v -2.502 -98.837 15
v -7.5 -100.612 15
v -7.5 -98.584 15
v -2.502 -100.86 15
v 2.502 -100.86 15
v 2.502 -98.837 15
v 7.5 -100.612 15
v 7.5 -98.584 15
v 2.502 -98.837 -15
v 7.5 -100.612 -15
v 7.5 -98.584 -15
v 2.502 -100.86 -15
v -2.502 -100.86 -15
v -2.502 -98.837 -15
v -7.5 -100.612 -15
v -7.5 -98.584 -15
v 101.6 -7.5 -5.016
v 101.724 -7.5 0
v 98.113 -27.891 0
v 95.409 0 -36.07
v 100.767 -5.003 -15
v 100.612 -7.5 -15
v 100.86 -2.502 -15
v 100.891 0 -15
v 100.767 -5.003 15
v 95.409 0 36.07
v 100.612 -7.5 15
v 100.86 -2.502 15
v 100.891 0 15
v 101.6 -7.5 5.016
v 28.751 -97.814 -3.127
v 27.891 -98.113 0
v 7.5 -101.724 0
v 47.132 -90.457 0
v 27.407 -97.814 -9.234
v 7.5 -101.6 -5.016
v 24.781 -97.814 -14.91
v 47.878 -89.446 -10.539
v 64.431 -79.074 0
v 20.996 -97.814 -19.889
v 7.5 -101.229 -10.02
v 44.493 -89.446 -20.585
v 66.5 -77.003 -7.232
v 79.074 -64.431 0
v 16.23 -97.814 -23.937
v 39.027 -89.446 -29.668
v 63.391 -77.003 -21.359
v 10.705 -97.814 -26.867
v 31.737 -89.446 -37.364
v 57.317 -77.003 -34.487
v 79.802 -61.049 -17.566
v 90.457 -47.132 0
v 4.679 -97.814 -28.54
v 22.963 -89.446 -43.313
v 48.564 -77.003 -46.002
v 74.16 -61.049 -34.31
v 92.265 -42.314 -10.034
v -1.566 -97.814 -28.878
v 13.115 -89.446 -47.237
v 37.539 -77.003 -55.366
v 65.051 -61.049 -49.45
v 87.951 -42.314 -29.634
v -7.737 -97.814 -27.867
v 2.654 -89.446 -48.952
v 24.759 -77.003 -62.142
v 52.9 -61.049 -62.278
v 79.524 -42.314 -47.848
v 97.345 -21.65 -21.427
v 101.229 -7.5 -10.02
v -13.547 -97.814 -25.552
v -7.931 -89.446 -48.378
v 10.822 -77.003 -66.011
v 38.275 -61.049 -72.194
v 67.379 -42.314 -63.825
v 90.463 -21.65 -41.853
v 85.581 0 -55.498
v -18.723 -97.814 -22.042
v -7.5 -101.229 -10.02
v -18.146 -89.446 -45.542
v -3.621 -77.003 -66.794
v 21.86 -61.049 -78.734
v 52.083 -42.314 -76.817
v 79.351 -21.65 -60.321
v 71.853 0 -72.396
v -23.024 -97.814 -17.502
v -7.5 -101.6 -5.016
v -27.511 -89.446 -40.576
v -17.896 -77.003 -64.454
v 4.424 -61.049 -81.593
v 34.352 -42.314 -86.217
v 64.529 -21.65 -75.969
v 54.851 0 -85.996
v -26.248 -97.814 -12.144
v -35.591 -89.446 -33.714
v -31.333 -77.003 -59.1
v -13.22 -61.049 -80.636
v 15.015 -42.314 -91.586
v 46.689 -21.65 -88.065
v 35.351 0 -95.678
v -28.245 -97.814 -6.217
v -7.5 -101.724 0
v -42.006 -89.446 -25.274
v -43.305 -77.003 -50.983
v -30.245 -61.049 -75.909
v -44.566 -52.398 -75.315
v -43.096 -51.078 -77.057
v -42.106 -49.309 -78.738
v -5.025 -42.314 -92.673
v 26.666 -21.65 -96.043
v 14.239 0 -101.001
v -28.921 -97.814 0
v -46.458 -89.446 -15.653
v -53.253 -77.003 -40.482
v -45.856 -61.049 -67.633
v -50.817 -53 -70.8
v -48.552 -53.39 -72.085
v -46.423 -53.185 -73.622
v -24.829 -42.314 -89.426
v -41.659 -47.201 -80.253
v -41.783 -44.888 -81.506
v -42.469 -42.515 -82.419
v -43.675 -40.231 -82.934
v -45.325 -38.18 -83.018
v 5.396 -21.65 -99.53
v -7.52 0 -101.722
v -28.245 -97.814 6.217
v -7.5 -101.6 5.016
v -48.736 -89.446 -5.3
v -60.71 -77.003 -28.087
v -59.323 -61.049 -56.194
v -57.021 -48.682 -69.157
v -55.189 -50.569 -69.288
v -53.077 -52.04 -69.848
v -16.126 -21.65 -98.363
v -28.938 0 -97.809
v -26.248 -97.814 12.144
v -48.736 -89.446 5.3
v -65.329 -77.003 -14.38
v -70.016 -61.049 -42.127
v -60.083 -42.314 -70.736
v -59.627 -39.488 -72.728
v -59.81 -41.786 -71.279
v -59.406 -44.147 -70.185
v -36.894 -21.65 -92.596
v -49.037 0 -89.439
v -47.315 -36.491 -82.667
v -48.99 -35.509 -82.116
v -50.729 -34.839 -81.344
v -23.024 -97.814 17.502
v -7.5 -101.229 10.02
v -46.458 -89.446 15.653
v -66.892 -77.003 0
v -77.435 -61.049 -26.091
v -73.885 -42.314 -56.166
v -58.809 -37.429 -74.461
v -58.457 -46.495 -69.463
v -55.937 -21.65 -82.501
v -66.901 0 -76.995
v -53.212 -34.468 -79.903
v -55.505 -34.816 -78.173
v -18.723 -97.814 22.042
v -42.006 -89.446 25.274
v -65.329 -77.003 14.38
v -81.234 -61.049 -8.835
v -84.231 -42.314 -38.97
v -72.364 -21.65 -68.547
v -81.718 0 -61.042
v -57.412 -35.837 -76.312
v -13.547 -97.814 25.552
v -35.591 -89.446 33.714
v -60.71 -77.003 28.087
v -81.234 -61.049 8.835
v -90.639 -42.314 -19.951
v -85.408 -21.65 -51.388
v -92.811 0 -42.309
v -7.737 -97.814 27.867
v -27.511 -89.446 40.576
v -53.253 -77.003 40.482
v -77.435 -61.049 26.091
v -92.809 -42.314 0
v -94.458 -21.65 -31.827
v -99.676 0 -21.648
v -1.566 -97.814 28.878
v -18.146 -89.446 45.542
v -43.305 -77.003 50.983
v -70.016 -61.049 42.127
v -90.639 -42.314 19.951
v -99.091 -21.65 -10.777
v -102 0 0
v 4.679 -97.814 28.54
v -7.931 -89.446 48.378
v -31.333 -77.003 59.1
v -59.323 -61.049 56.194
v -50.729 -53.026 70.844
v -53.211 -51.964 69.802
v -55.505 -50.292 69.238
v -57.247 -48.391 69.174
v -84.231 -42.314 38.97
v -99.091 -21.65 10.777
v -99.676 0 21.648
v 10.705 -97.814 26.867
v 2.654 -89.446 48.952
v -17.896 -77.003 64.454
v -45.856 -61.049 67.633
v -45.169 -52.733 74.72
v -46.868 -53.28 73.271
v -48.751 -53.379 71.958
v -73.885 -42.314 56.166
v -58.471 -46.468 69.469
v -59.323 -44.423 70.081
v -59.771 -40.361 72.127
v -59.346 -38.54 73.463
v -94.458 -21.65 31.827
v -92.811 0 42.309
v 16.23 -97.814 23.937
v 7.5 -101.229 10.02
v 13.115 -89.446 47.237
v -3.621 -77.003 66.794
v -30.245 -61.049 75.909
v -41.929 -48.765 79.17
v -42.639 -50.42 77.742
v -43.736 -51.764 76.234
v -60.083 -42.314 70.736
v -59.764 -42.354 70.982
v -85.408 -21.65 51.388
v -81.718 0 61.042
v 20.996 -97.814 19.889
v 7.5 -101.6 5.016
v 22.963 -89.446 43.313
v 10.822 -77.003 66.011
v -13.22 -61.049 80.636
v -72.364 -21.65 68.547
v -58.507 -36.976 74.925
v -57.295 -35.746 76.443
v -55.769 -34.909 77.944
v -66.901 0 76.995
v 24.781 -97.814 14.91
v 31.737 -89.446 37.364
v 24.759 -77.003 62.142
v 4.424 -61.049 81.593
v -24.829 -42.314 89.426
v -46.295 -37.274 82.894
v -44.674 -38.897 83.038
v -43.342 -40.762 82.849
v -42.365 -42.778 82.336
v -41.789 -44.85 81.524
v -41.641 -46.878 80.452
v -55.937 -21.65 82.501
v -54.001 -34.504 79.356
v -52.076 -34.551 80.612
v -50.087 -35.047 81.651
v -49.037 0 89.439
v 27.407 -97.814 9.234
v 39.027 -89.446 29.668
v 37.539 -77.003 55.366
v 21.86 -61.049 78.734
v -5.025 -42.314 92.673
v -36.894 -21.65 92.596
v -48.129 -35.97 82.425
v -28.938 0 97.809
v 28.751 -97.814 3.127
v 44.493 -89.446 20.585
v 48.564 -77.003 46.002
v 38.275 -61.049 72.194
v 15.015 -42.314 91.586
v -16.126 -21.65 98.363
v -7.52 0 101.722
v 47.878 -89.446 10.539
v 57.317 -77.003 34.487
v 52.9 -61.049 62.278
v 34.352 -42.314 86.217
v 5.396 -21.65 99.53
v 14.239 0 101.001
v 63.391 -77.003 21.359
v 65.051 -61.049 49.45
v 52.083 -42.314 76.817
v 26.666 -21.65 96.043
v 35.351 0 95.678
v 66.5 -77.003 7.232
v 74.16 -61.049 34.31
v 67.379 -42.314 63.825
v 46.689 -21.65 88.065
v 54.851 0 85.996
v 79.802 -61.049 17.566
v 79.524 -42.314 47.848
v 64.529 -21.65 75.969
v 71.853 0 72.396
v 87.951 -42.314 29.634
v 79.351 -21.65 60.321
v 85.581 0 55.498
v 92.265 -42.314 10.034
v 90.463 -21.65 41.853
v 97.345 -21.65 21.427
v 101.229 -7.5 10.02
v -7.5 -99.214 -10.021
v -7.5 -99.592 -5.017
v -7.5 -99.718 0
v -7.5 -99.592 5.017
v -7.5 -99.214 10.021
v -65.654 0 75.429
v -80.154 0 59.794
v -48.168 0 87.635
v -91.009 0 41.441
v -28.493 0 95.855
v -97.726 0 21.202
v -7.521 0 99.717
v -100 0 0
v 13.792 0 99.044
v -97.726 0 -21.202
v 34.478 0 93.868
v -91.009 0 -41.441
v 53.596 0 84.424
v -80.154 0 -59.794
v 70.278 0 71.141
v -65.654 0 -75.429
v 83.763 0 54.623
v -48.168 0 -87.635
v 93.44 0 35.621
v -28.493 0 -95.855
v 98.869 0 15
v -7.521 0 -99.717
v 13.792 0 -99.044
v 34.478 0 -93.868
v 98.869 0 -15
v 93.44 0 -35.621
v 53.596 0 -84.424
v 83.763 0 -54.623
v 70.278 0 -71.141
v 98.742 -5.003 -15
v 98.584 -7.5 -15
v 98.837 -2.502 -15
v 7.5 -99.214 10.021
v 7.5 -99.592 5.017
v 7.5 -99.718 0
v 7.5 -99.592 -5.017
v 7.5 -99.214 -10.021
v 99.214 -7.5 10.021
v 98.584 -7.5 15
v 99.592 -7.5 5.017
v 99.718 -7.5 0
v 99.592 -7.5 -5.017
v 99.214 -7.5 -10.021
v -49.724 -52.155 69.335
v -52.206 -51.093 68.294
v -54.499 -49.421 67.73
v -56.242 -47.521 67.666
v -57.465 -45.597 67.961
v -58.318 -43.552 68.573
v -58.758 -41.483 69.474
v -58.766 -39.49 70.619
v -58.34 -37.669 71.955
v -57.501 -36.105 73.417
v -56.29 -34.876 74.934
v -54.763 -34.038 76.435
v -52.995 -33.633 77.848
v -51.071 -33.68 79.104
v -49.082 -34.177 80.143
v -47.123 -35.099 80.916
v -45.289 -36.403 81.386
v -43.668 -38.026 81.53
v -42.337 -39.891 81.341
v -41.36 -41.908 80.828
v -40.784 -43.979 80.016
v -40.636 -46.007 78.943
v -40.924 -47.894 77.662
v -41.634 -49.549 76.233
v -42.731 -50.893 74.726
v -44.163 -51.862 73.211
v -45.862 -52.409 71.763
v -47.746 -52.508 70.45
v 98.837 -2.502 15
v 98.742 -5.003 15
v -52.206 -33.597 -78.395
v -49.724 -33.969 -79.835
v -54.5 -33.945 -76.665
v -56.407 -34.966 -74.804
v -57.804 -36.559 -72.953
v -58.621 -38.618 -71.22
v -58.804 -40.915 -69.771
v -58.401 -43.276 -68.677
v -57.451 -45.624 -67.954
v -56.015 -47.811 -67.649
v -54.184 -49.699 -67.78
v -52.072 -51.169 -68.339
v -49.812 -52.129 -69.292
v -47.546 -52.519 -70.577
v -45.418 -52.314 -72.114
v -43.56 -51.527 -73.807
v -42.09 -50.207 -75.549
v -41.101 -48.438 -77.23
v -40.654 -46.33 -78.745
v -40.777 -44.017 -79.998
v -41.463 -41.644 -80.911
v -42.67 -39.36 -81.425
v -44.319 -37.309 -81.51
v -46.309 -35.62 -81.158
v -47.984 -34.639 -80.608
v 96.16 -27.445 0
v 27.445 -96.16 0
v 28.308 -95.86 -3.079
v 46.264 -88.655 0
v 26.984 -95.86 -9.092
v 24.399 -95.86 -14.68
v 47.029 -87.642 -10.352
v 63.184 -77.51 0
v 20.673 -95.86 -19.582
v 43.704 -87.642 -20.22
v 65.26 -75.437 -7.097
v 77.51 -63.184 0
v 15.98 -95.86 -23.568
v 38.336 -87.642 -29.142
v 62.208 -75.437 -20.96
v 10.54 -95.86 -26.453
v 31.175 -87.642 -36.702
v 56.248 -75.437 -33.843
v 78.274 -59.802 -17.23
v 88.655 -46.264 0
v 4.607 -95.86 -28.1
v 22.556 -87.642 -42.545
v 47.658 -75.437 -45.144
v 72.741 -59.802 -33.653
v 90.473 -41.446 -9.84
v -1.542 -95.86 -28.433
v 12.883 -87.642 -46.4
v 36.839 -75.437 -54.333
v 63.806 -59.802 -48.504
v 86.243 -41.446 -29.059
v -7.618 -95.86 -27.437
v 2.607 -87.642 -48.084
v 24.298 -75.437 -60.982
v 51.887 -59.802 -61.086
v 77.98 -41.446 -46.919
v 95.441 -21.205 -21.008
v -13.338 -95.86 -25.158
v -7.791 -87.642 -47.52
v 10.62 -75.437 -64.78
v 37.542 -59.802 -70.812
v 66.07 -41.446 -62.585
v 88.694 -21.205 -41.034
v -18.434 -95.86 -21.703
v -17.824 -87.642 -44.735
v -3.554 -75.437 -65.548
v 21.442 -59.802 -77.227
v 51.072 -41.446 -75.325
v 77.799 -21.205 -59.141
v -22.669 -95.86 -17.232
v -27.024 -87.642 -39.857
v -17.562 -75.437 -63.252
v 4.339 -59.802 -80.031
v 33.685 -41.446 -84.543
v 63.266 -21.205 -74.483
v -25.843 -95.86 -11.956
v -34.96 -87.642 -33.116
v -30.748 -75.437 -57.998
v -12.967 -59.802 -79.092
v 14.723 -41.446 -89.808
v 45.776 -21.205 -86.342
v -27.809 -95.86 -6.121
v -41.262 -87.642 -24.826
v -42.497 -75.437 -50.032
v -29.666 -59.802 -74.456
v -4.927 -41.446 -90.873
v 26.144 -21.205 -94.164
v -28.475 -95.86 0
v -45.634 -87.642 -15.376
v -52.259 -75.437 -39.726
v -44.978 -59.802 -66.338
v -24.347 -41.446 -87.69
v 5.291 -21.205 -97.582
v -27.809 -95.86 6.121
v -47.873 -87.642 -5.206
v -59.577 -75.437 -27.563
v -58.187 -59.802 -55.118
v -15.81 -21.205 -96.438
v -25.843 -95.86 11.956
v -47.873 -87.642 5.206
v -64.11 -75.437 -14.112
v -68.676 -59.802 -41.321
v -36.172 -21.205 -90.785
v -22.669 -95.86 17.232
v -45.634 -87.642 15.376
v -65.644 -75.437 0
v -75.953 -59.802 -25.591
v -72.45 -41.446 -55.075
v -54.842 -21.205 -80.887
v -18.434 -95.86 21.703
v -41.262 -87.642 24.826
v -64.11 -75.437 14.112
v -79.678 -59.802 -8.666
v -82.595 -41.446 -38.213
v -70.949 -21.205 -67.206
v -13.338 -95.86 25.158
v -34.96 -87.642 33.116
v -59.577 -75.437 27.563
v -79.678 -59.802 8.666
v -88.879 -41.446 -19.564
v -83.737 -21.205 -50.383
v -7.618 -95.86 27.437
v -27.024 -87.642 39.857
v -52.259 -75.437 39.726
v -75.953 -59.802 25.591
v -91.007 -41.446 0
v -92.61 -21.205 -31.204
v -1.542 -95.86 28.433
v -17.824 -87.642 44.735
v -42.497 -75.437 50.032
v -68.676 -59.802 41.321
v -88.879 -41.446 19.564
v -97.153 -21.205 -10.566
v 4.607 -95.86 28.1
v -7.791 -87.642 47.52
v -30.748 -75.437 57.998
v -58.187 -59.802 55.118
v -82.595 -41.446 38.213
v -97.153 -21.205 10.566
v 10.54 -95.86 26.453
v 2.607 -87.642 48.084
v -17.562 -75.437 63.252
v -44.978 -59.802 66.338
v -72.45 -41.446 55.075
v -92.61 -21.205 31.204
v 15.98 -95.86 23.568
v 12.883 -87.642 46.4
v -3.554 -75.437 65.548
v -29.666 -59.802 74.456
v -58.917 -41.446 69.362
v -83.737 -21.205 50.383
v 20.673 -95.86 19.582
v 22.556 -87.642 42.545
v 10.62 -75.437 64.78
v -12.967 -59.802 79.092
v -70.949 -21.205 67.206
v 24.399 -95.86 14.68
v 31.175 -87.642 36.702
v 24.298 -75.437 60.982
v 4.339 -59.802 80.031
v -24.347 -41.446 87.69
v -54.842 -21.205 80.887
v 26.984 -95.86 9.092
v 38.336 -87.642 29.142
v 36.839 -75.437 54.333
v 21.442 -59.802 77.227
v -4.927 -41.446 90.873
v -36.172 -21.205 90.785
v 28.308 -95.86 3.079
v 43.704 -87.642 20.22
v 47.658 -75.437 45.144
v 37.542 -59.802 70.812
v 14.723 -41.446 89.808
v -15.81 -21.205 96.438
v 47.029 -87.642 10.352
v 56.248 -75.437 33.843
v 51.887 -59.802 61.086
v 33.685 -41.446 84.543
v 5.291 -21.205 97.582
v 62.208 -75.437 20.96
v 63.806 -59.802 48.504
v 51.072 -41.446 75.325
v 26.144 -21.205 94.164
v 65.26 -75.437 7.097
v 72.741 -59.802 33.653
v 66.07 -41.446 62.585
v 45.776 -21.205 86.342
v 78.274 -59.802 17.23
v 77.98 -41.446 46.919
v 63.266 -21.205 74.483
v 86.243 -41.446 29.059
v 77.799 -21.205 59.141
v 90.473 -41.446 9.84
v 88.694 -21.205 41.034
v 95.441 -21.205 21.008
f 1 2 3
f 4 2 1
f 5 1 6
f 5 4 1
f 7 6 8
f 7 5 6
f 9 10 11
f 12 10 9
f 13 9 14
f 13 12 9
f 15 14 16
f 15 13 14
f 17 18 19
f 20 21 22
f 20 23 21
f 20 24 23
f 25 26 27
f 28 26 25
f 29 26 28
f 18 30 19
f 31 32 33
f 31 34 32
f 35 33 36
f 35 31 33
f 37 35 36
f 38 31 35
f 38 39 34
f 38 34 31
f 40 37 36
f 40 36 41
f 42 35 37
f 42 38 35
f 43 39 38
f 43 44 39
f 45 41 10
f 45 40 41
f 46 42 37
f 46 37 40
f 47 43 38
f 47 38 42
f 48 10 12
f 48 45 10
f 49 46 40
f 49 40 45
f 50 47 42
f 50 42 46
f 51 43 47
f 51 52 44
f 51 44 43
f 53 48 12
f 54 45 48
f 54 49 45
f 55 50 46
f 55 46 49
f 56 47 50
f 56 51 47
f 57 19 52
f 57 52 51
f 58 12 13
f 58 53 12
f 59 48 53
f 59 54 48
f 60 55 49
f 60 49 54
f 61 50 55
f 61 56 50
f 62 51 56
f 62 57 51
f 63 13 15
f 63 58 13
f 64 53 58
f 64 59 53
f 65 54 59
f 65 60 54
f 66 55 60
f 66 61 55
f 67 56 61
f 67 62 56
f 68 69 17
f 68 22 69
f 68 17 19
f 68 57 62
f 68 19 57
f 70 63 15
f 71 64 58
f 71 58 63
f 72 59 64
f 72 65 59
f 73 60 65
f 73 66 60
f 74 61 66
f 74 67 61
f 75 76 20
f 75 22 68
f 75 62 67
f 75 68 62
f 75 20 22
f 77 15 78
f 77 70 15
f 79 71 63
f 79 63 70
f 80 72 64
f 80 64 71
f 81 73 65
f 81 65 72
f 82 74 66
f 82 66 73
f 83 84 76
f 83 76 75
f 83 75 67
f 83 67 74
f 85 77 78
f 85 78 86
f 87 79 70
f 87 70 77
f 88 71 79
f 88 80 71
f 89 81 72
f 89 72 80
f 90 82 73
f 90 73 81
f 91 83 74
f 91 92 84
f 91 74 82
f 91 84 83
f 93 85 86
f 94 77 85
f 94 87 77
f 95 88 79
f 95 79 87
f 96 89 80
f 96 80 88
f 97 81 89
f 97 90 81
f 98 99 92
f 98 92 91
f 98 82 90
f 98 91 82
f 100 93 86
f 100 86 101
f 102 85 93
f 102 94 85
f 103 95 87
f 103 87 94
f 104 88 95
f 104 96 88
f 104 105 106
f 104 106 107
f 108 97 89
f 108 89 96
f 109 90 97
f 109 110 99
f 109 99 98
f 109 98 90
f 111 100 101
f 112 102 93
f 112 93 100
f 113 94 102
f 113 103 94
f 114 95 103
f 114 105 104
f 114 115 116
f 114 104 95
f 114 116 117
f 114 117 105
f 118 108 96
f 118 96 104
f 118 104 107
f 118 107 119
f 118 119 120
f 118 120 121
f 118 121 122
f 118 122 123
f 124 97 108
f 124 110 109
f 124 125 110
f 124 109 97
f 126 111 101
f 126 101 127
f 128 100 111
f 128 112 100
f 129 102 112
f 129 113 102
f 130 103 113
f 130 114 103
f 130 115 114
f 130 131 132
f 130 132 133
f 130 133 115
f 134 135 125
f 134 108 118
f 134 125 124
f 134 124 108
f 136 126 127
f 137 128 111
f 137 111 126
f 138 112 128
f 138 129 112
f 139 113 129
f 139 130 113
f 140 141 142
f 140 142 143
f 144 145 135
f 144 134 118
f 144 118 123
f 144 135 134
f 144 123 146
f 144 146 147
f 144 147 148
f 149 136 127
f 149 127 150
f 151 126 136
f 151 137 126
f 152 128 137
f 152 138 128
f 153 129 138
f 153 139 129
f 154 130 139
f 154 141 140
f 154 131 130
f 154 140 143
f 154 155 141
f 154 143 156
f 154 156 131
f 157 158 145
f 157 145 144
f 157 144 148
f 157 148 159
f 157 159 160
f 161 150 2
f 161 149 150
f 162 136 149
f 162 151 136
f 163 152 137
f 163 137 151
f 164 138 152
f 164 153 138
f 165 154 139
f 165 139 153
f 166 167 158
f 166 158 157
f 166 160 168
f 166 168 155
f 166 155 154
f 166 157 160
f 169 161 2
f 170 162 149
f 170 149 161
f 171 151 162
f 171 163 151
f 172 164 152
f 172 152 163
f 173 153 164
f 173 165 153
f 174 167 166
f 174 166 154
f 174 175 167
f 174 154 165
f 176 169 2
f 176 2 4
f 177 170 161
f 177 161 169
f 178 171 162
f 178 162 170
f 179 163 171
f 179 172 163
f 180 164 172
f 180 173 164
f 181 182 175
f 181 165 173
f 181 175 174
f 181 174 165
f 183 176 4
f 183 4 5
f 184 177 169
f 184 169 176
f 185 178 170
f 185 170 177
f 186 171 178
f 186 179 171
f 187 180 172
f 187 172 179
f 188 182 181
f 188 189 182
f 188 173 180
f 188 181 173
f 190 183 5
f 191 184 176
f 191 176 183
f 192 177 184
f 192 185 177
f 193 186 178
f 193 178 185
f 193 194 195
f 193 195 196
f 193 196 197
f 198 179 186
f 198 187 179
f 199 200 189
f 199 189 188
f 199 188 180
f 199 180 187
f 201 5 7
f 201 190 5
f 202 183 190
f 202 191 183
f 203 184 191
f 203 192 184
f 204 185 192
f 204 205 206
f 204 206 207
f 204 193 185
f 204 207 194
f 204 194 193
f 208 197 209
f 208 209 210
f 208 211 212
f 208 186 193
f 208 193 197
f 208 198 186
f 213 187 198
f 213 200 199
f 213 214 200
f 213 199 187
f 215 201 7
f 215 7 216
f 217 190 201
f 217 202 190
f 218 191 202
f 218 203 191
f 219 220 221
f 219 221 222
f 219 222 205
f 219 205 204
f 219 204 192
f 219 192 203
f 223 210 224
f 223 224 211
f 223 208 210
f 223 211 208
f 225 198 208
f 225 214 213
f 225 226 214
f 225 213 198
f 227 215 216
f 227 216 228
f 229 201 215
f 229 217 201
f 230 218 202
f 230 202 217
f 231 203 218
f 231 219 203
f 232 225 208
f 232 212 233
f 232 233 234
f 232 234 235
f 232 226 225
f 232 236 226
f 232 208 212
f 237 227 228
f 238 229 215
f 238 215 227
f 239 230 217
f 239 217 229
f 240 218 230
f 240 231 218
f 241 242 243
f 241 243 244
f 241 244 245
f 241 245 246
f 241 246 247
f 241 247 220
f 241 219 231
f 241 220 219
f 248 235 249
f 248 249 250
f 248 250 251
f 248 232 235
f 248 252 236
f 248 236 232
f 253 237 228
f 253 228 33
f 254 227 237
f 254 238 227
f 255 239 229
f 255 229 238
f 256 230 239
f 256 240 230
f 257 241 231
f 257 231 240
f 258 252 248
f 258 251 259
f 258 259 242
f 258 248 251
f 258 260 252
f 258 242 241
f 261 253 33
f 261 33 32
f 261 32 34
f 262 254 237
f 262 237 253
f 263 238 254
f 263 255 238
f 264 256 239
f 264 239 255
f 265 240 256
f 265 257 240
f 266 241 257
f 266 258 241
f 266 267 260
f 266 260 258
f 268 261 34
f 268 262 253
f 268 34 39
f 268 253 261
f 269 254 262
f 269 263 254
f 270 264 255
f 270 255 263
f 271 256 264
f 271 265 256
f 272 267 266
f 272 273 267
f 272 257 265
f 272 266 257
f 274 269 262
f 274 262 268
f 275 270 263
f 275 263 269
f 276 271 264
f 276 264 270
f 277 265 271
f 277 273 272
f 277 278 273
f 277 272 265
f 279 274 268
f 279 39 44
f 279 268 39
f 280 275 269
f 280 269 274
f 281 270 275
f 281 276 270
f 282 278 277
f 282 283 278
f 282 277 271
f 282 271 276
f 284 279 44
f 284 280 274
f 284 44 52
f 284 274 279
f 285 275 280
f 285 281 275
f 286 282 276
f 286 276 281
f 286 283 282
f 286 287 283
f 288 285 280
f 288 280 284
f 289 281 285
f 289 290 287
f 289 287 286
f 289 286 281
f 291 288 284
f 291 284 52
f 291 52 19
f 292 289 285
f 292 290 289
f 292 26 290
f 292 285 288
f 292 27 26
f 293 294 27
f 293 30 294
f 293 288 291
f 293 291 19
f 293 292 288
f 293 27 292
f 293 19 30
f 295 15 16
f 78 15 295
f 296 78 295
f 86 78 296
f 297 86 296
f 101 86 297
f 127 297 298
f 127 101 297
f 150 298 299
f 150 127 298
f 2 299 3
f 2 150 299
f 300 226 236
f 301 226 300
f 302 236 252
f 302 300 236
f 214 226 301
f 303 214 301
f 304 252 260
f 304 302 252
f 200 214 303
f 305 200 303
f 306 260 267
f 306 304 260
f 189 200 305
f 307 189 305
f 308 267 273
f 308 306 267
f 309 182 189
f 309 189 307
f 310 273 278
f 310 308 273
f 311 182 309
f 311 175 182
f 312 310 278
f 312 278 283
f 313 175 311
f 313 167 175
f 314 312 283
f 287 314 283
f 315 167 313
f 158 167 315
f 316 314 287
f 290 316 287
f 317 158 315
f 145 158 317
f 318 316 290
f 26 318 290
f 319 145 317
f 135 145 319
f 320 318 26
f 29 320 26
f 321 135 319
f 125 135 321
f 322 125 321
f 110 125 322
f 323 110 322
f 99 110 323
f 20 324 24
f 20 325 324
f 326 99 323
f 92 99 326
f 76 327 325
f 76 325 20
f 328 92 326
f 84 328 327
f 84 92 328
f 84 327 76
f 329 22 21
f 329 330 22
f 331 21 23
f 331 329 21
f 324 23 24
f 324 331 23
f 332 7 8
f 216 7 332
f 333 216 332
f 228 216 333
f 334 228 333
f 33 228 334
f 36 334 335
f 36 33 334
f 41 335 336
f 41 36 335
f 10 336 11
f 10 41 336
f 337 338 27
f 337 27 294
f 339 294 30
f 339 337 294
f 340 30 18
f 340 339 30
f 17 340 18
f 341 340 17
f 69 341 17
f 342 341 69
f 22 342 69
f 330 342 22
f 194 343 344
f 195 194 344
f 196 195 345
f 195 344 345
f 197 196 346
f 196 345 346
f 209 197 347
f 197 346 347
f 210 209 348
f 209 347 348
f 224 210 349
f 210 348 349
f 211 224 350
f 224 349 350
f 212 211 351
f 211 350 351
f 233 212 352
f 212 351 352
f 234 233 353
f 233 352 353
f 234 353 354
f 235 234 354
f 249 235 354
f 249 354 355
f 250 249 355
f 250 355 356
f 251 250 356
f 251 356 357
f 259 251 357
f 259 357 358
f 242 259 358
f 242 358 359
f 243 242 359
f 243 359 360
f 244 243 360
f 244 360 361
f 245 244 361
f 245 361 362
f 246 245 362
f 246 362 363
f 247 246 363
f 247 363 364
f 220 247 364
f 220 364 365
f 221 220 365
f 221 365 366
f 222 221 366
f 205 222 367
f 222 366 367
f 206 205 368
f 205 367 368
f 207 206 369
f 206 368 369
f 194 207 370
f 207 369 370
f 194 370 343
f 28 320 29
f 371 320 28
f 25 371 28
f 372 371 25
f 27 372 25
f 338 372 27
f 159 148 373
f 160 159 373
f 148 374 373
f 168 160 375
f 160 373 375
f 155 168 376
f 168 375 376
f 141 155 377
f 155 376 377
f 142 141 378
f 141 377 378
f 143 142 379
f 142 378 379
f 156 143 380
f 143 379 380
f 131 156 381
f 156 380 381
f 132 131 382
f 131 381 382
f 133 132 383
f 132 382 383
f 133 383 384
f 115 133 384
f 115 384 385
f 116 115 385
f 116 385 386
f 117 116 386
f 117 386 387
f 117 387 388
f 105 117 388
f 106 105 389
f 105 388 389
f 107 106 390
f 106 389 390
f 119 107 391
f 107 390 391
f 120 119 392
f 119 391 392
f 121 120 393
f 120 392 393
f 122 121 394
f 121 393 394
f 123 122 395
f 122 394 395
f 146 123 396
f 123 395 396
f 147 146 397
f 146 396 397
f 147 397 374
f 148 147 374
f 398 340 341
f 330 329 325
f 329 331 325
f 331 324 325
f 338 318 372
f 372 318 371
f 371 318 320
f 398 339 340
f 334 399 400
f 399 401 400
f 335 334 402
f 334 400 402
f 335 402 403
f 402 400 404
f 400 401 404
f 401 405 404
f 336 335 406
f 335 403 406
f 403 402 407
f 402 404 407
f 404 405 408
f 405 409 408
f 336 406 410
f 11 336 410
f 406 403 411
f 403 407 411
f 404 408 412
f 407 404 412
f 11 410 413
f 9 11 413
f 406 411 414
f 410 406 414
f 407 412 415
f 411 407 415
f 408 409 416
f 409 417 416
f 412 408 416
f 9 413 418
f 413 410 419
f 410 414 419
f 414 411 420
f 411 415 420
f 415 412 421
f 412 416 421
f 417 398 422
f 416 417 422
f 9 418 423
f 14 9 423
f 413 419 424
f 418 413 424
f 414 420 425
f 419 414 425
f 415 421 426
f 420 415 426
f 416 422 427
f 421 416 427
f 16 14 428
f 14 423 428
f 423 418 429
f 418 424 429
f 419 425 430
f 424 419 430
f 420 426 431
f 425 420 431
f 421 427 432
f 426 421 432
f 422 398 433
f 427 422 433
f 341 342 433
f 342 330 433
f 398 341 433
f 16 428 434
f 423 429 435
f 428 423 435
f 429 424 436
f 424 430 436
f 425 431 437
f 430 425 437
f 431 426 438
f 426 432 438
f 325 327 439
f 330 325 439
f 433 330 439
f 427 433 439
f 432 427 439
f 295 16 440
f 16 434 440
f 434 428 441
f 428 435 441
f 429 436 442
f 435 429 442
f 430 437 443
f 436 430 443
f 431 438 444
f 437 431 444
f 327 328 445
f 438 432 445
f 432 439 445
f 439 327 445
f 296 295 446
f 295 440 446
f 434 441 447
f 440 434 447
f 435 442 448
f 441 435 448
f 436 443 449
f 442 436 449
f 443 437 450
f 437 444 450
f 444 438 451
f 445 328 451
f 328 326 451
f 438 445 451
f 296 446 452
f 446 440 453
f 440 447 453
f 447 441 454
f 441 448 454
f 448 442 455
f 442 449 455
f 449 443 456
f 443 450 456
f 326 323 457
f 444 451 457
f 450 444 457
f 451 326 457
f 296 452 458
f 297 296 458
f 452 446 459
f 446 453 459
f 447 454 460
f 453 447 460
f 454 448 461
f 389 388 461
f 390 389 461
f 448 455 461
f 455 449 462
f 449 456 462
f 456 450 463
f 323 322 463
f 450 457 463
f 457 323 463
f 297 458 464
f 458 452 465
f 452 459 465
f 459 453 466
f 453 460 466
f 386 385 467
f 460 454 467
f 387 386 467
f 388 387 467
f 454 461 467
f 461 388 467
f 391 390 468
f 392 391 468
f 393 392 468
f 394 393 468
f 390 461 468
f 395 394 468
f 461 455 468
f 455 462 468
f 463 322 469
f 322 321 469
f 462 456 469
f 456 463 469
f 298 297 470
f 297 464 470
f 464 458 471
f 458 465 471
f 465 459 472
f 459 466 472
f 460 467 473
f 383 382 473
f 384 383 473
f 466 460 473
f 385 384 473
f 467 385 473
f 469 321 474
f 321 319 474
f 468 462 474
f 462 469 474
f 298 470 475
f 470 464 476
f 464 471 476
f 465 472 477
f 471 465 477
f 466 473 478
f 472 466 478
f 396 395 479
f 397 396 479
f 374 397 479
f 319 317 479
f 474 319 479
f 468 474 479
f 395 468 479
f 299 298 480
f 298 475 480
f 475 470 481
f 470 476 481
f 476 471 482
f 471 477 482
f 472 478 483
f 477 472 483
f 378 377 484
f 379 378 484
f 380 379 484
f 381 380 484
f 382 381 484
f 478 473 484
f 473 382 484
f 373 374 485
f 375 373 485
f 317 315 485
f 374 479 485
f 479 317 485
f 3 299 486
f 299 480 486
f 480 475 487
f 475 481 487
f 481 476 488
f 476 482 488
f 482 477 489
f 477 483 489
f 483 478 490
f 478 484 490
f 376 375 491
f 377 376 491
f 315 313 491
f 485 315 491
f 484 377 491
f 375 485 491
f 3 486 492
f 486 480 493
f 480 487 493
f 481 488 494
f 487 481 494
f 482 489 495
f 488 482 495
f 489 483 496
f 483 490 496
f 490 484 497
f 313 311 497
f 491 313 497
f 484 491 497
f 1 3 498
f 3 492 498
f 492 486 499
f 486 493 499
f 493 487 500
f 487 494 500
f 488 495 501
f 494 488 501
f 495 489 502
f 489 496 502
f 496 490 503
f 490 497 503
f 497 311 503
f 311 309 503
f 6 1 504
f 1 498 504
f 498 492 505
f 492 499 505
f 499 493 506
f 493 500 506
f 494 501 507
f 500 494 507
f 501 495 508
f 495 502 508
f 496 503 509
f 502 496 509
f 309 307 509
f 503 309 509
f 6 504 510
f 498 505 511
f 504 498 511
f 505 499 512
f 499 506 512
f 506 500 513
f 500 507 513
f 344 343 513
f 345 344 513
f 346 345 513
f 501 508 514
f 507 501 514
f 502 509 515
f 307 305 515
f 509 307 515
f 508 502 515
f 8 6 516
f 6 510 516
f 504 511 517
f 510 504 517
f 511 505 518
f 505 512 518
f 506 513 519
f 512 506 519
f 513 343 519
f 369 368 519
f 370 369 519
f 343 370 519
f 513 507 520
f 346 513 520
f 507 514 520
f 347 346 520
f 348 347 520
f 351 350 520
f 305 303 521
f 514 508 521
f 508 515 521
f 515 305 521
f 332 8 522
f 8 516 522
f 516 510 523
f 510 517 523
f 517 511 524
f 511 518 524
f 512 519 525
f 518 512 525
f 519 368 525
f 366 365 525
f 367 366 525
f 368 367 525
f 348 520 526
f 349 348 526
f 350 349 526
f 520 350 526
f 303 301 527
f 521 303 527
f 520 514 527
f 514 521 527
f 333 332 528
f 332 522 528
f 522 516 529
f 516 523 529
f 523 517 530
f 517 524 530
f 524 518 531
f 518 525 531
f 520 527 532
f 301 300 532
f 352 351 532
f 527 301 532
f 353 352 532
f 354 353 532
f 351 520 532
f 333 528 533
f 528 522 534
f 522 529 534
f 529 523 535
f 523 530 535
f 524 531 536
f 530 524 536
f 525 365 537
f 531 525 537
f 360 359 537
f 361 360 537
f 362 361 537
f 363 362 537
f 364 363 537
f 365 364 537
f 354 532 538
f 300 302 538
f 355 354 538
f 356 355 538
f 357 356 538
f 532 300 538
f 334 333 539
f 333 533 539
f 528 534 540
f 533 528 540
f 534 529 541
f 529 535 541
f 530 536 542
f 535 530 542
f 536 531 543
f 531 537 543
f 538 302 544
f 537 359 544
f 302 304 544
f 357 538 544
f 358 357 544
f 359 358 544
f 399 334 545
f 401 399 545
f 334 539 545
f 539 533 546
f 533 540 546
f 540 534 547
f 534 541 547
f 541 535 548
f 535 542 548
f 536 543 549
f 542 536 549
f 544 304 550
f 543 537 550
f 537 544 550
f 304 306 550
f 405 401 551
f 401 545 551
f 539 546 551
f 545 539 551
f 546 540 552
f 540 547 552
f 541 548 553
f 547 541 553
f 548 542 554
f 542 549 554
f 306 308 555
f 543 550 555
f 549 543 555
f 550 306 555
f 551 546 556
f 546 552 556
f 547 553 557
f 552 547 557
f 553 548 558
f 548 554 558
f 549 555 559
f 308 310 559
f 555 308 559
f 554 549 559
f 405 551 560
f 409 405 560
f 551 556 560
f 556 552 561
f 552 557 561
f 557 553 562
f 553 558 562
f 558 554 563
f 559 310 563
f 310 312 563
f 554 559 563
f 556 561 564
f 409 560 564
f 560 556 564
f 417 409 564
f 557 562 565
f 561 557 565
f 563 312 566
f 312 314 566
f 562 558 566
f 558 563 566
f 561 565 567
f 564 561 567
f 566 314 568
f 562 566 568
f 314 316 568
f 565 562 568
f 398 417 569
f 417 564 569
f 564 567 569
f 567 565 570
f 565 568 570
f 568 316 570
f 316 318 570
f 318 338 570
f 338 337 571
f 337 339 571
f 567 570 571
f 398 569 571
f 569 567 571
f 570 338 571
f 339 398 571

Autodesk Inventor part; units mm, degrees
ref_plane "YZ Plane" through (0, 0, 0) normal (1, 0, 0) x (0, 1, 0)
ref_plane "XZ Plane" through (0, 0, 0) normal (0, 1, 0) x (-1, 0, 0)
sketch "Skizze2" plane through (0, 0, 0) normal (0, 0, 1) x (1, 0, 0)
  line L0 (100, 0) -> (102, 0)
  arc A0 (0, -102) -> (102, 0) centre (0, 0) ccw
  line L1 (0, -102) -> (0, -100)
  arc A1 (0, -100) -> (100, 0) centre (0, 0) ccw
  point P0 (0, 0)
  point P1 (0, -101)
  point P2 (101, 0)
  dimension "d0" = 2
  dimension "d1" = 2
  dimension "d3" = 100
  dimension "d4" = 100
revolve "Umdrehung1" add sketch "Skizze2" angle 360 about axis through (0, -102, 0) along (0, 1, 0)
ref_plane "Arbeitsebene1" through (0, -102, 0) normal (0, 1, 0) x (-1, 0, 0)
sketch "Skizze3" plane through (0, -102, 0) normal (0, 1, 0) x (-1, 0, 0)
  line L0 (7.5, 15) -> (-7.5, 15)
  line L1 (-7.5, 15) -> (-7.5, -15)
  line L2 (-7.5, -15) -> (7.5, -15)
  line L3 (7.5, -15) -> (7.5, 15)
  point P0 (0, 0)
  point P1 (7.5, 0)
  point P2 (0, 15)
  dimension "d6" = 15
  dimension "d7" = 30
extrude "Extrusion1" cut sketch "Skizze3" along normal through all both and the other way through all
sketch "Skizze4" plane through (0, 0, 0) normal (1, 0, 0) x (0, 1, 0)
  line L0 (7.5, 15) -> (-7.5, 15)
  line L1 (-7.5, 15) -> (-7.5, -15)
  line L2 (-7.5, -15) -> (7.5, -15)
  line L3 (7.5, -15) -> (7.5, 15)
  point P0 (0, 0)
  point P1 (0, 0)
  point P2 (7.5, 0)
  point P3 (0, 15)
  point P4 (-7.5, 0)
  dimension "d10" = 15
  dimension "d11" = 30
extrude "Extrusion2" cut sketch "Skizze4" along normal through all
sketch "Skizze6" plane through (0, 0, 0) normal (0, 1, 0) x (1, 0, 0)
  line L0 (0, 0) -> (-94.1178, 163.0168) construction
  line L1 (0, 0) -> (188.2356, 0) construction
  line L2 (0, 0) -> (-95.3588, -165.1662) construction
  line L3 (0, 0) -> (190.7175, 0) construction
  arc A0 (100.891, 15) -> (100.891, -15) centre (0, 0) ccw construction
  point P0 (-51, -88.3346)
  point P1 (-51, 88.3346)
  dimension "d16" = 120
  dimension "d17" = 120
ref_plane "Arbeitsebene7" through (-51, 0, -88.3346) normal (1, 0, 0) x (0, 1, 0)
sketch "Skizze14" plane through (-51, 0, -88.3346) normal (1, 0, 0) x (0, 1, 0)
  circle A0 centre (0, 88.3346) radius 88.3346 construction
  line L0 (0, 88.3346) -> (-48.5836, 172.4838) construction
  line L1 (0, 188.3346) -> (0, -11.6654) construction
  line L2 (0, 88.3346) -> (-62.5691, -20.0382) construction
  point P0 (0, 103.3346)
  point P1 (0, 73.3346)
  point P2 (-44.1673, 164.8346)
  point P3 (-44.1673, 11.8346)
  dimension "d38" = 176.6692
  dimension "d39" = 30
  dimension "d40" = 30
sketch "Skizze16" plane through (0, 0, 0) normal (0, 1, 0) x (1, 0, 0)
  circle A0 centre (0, 0) radius 102 construction
  arc A1 (100.891, 15) -> (100.891, -15) centre (0, 0) ccw construction
  arc A2 (100.6119, -15) -> (100.6119, 15) centre (0, 0) ccw construction
  point P0 (101.7239, 0)
  dimension "d37" = 204
ref_plane "Arbeitsebene8" through (-51, -44.1673, -76.5) normal (-0.5, -0.433, -0.75) x (0.6547, -0.7559, 0)
ref_plane "Arbeitsebene9" through (-51, -44.1673, 76.5) normal (-0.5, -0.433, 0.75) x (0.6547, -0.7559, 0)
sketch "Skizze17" plane through (-51, -44.1673, -76.5) normal (-0.5, -0.433, -0.75) x (0.6547, -0.7559, 0)
  point P0 (0, 0)
  point P1 (0, 0)
hole "Bohrung3" at (-51, -44.1673, -76.5) direction (0.5, 0.433, 0.75) diameter 21 depth 8 tip angle 118
sketch "Skizze18" plane through (-51, -44.1673, 76.5) normal (-0.5, -0.433, 0.75) x (0.6547, -0.7559, 0)
  point P0 (0, 0)
  point P1 (0, 0)
hole "Bohrung4" at (-51, -44.1673, 76.5) direction (0.5, 0.433, -0.75) diameter 21 depth 8 tip angle 118
properties part number "Schale_V1"
